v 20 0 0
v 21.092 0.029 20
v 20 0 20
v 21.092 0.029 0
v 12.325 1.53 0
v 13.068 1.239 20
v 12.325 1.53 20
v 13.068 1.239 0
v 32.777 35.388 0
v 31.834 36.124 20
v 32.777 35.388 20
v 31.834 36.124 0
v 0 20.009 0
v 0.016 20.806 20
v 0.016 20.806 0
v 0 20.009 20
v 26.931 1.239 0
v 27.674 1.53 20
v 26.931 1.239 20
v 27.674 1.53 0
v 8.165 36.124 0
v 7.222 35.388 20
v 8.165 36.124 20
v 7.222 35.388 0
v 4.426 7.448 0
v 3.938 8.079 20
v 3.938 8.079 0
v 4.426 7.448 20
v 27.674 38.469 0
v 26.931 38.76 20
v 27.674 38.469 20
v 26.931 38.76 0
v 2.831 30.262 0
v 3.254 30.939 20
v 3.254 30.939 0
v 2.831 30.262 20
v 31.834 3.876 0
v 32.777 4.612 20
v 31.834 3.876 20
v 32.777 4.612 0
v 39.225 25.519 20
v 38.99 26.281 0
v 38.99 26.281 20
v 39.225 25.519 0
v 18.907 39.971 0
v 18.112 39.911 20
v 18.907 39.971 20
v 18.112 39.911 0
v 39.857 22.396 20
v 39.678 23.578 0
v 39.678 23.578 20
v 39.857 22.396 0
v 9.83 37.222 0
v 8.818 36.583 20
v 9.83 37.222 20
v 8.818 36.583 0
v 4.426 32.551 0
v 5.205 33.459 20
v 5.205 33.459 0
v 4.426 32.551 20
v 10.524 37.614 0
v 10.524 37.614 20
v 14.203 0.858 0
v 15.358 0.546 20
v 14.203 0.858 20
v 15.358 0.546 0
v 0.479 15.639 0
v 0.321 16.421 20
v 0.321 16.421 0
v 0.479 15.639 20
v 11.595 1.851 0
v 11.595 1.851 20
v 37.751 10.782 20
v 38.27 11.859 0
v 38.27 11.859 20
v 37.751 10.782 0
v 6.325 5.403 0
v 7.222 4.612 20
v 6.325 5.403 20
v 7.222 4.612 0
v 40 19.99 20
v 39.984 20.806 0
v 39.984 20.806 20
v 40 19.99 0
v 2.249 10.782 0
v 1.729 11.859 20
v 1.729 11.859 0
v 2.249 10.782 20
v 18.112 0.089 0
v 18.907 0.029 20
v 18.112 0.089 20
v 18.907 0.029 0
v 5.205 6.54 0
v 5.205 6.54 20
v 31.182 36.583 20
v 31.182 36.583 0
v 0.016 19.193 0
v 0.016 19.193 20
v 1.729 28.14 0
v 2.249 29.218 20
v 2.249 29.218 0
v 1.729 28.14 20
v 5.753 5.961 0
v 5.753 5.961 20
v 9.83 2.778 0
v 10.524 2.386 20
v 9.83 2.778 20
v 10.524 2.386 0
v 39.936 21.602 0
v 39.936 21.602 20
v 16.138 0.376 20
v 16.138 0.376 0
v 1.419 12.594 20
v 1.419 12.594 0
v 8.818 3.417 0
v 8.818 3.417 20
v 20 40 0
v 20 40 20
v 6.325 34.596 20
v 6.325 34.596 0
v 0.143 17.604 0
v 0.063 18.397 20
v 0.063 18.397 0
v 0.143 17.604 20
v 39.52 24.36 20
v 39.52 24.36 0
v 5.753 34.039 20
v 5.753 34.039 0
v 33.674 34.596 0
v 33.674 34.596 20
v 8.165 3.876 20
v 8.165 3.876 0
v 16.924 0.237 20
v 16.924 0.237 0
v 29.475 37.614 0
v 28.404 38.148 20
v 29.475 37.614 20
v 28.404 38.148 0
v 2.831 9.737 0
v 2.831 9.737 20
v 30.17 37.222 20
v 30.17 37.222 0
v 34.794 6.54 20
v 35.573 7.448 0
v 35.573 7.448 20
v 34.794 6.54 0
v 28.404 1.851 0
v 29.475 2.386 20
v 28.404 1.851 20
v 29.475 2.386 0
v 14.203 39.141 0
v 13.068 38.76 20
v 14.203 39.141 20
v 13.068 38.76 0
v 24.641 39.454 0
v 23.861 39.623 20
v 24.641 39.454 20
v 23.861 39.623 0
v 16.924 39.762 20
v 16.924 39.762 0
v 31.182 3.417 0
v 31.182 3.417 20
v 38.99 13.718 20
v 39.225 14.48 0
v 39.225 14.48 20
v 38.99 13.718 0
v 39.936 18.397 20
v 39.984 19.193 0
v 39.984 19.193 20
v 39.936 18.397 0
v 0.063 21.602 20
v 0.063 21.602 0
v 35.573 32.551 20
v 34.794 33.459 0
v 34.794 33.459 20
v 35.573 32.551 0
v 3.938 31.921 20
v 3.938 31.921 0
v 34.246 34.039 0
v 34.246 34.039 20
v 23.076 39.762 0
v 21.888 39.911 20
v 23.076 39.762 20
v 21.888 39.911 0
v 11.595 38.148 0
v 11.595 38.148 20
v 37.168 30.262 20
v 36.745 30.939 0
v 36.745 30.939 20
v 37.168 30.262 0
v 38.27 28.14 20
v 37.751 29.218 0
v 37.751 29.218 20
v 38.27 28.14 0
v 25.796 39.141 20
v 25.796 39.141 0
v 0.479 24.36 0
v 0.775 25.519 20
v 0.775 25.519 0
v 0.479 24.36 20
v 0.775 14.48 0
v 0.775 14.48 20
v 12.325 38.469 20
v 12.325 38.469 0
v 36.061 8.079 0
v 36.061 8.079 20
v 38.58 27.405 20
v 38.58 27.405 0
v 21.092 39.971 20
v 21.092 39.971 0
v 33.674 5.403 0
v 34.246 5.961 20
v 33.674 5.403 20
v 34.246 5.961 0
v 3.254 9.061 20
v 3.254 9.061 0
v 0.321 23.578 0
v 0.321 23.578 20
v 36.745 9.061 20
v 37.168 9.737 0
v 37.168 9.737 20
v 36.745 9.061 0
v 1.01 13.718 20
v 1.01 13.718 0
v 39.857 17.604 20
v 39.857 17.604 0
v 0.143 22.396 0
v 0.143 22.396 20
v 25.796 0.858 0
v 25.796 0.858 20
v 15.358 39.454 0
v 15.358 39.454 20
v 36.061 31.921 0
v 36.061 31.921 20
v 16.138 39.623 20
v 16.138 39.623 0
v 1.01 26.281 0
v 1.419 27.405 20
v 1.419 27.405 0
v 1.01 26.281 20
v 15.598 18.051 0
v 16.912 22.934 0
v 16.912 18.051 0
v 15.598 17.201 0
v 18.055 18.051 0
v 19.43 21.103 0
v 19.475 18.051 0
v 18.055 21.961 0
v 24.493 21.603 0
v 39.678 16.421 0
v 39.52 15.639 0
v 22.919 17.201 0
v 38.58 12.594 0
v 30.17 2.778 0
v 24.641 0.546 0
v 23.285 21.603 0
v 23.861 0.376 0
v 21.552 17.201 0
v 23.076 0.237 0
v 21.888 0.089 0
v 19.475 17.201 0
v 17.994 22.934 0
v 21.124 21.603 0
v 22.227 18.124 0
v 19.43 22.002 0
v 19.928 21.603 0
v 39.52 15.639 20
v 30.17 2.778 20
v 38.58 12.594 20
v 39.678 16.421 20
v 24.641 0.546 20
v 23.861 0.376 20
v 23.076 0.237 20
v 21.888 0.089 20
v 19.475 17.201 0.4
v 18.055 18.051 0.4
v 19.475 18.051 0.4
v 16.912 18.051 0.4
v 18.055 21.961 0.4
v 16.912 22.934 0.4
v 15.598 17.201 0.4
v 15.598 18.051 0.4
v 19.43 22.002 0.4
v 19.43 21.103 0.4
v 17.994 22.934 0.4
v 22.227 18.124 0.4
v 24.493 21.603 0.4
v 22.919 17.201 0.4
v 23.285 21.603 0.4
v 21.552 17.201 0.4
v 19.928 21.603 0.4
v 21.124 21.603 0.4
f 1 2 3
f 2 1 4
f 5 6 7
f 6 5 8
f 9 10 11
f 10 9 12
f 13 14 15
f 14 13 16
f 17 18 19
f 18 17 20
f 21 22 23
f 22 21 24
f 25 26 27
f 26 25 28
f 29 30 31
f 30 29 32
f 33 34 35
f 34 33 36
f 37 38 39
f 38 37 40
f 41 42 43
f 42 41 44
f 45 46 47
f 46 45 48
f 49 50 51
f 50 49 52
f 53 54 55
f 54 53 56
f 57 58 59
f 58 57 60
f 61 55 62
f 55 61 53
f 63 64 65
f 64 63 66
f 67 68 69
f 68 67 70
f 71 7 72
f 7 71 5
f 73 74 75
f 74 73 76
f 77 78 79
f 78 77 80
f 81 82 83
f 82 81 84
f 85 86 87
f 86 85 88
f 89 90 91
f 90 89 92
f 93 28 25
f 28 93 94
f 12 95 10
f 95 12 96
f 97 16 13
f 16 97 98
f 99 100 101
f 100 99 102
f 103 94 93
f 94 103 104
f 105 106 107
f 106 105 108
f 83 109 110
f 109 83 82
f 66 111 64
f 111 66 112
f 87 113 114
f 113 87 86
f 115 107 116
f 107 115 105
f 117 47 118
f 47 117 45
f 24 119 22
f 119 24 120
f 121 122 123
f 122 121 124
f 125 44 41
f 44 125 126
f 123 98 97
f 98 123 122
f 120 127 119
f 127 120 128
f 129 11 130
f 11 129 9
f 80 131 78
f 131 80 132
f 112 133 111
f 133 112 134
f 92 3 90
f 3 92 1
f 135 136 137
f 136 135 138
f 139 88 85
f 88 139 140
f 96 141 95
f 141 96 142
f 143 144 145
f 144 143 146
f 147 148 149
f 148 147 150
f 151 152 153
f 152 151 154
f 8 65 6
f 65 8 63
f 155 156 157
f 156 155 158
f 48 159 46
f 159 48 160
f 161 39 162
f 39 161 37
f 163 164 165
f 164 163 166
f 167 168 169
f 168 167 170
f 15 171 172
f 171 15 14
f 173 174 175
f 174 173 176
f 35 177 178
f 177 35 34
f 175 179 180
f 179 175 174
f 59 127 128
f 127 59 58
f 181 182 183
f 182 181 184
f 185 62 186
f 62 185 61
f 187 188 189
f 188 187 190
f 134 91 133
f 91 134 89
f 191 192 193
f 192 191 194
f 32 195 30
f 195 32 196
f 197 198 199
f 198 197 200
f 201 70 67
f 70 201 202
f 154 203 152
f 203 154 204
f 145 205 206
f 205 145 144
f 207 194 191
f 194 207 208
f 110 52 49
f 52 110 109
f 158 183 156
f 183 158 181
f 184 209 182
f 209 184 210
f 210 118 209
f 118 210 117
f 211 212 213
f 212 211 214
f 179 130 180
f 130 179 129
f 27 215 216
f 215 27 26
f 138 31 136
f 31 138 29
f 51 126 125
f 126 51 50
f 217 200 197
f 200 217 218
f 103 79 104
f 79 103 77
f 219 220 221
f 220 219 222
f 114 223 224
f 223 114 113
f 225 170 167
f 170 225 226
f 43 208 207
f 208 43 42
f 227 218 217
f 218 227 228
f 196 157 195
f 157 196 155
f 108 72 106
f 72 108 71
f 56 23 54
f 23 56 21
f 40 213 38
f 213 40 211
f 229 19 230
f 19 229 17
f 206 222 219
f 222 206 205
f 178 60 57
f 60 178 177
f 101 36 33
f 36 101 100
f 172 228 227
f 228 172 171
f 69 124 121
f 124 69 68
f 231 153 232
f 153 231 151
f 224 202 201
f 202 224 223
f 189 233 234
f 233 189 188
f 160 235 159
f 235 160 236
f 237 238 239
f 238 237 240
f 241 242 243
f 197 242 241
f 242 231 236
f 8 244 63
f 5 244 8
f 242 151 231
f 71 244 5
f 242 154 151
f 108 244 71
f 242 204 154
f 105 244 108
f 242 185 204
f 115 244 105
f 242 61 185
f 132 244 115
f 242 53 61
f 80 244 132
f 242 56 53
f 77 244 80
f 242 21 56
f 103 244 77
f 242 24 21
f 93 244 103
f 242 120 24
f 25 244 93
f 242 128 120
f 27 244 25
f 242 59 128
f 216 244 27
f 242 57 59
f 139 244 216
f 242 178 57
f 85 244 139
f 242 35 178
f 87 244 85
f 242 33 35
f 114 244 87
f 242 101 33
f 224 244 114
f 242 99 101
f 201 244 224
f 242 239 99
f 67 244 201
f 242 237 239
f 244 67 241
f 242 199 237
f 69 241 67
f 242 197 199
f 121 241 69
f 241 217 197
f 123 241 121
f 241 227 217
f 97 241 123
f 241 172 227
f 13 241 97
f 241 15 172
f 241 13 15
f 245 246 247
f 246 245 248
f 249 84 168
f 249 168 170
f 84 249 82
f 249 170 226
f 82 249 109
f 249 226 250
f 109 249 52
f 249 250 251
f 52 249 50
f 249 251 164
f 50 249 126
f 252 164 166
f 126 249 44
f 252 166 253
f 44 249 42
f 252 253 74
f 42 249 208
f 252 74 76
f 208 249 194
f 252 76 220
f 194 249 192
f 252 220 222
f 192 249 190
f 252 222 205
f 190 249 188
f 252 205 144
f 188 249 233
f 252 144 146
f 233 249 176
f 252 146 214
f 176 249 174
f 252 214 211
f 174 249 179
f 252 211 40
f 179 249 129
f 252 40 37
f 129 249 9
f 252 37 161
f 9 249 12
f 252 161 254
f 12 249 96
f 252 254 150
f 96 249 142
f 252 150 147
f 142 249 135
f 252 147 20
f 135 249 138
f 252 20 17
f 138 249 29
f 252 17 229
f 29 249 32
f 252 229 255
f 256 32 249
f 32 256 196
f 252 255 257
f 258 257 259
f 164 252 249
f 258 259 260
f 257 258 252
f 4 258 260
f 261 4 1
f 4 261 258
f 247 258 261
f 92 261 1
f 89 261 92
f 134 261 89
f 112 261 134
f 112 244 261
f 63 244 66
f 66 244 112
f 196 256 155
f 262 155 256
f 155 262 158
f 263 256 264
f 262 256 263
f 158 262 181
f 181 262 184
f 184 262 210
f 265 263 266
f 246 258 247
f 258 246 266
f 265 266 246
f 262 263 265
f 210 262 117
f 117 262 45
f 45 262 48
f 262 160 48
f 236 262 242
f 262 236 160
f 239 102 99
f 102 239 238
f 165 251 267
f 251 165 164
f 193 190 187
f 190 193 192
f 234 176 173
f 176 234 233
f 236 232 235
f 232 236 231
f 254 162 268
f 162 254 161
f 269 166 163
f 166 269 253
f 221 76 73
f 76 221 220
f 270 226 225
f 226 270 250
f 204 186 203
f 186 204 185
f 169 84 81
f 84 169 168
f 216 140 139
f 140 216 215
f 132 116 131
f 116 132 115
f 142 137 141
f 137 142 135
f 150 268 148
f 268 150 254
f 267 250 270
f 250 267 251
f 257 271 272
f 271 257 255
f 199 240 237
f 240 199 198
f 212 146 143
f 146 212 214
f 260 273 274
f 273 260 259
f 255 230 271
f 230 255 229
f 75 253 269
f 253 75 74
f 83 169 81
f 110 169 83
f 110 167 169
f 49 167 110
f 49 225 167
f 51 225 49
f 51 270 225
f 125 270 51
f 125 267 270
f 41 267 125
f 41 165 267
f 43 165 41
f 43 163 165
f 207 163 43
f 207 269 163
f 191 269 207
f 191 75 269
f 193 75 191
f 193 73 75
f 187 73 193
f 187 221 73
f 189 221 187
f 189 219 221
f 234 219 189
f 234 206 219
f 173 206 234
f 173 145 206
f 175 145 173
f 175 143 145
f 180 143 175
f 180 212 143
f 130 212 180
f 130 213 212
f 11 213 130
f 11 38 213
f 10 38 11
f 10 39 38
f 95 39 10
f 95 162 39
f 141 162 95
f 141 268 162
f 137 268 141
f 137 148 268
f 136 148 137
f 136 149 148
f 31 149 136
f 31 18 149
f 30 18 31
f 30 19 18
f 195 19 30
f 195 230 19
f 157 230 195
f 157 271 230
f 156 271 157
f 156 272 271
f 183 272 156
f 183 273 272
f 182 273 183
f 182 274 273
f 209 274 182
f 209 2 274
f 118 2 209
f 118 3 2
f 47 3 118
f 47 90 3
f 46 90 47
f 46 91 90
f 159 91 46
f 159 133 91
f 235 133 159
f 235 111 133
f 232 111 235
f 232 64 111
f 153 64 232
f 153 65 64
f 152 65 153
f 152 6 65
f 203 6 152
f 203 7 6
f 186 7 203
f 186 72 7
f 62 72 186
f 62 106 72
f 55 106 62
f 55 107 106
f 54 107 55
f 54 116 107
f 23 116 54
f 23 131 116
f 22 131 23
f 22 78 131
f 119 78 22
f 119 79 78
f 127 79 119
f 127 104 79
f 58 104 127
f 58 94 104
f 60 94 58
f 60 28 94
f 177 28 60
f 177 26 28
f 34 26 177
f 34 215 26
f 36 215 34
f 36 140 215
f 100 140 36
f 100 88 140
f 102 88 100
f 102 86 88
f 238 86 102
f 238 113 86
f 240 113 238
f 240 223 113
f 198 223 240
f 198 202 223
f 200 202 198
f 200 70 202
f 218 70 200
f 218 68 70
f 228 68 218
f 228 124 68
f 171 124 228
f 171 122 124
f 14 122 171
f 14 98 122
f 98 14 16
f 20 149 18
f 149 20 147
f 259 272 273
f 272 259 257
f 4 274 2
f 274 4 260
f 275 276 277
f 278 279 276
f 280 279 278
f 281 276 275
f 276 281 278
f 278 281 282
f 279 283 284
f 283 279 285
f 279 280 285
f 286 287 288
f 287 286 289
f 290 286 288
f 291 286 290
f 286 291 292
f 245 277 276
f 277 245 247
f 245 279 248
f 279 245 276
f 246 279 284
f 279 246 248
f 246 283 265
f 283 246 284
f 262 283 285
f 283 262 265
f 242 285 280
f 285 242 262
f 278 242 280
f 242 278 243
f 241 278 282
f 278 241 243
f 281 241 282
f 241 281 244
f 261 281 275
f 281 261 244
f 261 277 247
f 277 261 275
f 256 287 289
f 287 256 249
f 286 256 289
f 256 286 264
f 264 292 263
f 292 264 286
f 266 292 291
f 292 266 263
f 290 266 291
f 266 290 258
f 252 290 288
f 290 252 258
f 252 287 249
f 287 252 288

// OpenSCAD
// circletest — generated by protobot from a sketch (input.jpg)
// 2026-10-28
//
// Print: Prusa Core One, 0.4 mm nozzle, PLA, 0.2 mm layers, flat on the bed.
// The outline is stored in a 0..1 unit box and scaled by LENGTH/WIDTH, so
// the three measurements below are all you need to change. Re-export with:
//   openscad --backend=manifold --export-format binstl -o circletest.stl circletest.scad
//
// Dimension tags: [M] = given by the user, [S] = traced from the sketch.

/* [Measurements] */
LENGTH    = 40;   // [M] X extent, mm
WIDTH     = 40;   // [M] Y extent, mm
THICKNESS = 20;   // [M] extrusion height, mm

/* [Edge finish] */
// Perimeter edges (outline AND holes), top and bottom faces.
// "fillet" = rounded, "chamfer" = 45°, "none" = sharp. Built in LAYER steps,
// i.e. exactly as the printer will lay it down.
EDGE_TOP_KIND    = "none";
EDGE_TOP         = 0;     // mm
EDGE_BOTTOM_KIND = "none";
EDGE_BOTTOM      = 0;     // mm
LAYER            = 0.2;   // mm, print layer height

/* [Version stamp] */
VERSION        = 1;       // bump every revision
VERSION_POS    = [0.5000, 0.5000];  // [S] unit-box spot deepest inside the shape
VERSION_SIZE   = 6;      // mm text height
VERSION_DEPTH  = 0.4;    // mm, 2 layers at 0.2

/* [Screws and nuts] */
// One entry per screw hole: [x, y] in the unit box (scaled by LENGTH/WIDTH),
// then its cuts: ["circle", Ø] = screw-head recess, ["hex", across flats] =
// nut pocket, each [.., depth mm, "top"|"bottom"]. The clearance hole itself
// is part of the outline below.
FASTENERS = [];

/* [Hidden] */
// [S] traced outline (+ holes), unit box, y up.
OUTLINE_PTS = [
    [1.00000,0.49977], [0.99960,0.47984], [0.99841,0.45994], [0.99642,0.44010], [0.99196,0.41053], [0.98801,0.39099],
    [0.98063,0.36201], [0.97475,0.34296], [0.96451,0.31486], [0.95676,0.29649], [0.94378,0.26955], [0.92921,0.24343],
    [0.91864,0.22652], [0.90154,0.20198], [0.88933,0.18621], [0.86987,0.16350], [0.85616,0.14902], [0.84187,0.13510],
    [0.81944,0.11531], [0.79586,0.09690], [0.77955,0.08543], [0.75425,0.06945], [0.73688,0.05966], [0.71011,0.04628],
    [0.69185,0.03826], [0.67328,0.03098], [0.64491,0.02146], [0.61603,0.01365], [0.59654,0.00940], [0.57689,0.00594],
    [0.54720,0.00222], [0.52731,0.00073], [0.50000,0.00000], [0.47269,0.00073], [0.45280,0.00222], [0.42311,0.00594],
    [0.40346,0.00940], [0.38397,0.01365], [0.35509,0.02146], [0.32672,0.03098], [0.30815,0.03826], [0.28989,0.04628],
    [0.26312,0.05966], [0.24575,0.06945], [0.22045,0.08543], [0.20414,0.09690], [0.18056,0.11531], [0.15813,0.13510],
    [0.14384,0.14902], [0.13013,0.16350], [0.11067,0.18621], [0.09846,0.20198], [0.08136,0.22652], [0.07079,0.24343],
    [0.05622,0.26955], [0.04324,0.29649], [0.03549,0.31486], [0.02525,0.34296], [0.01937,0.36201], [0.01199,0.39099],
    [0.00804,0.41053], [0.00358,0.44010], [0.00159,0.45994], [0.00040,0.47984], [0.00000,0.50023], [0.00040,0.52016],
    [0.00159,0.54006], [0.00358,0.55990], [0.00804,0.58947], [0.01199,0.60901], [0.01937,0.63799], [0.02525,0.65704],
    [0.03549,0.68514], [0.04324,0.70351], [0.05622,0.73045], [0.07079,0.75657], [0.08136,0.77348], [0.09846,0.79802],
    [0.11067,0.81379], [0.13013,0.83650], [0.14384,0.85098], [0.15813,0.86490], [0.18056,0.88469], [0.20414,0.90310],
    [0.22045,0.91457], [0.24575,0.93055], [0.26312,0.94034], [0.28989,0.95372], [0.30815,0.96174], [0.32672,0.96902],
    [0.35509,0.97854], [0.38397,0.98635], [0.40346,0.99060], [0.42311,0.99406], [0.45280,0.99778], [0.47269,0.99927],
    [0.50000,1.00000], [0.52731,0.99927], [0.54720,0.99778], [0.57689,0.99406], [0.59654,0.99060], [0.61603,0.98635],
    [0.64491,0.97854], [0.67328,0.96902], [0.69185,0.96174], [0.71011,0.95372], [0.73688,0.94034], [0.75425,0.93055],
    [0.77955,0.91457], [0.79586,0.90310], [0.81944,0.88469], [0.84187,0.86490], [0.85616,0.85098], [0.86987,0.83650],
    [0.88933,0.81379], [0.90154,0.79802], [0.91864,0.77348], [0.92921,0.75657], [0.94378,0.73045], [0.95676,0.70351],
    [0.96451,0.68514], [0.97475,0.65704], [0.98063,0.63799], [0.98801,0.60901], [0.99196,0.58947], [0.99642,0.55990],
    [0.99841,0.54006], [0.99960,0.52016]
];
OUTLINE_PATHS = [
    [for (i = [0:127]) i]
];

module outline_2d() {
    scale([LENGTH, WIDTH]) polygon(points = OUTLINE_PTS, paths = OUTLINE_PATHS);
}

// Debossed into the bottom face, mirrored so it reads from underneath.
module version_stamp() {
    if (!is_undef(VERSION_POS) && VERSION_SIZE > 0)
        translate([VERSION_POS[0] * LENGTH, VERSION_POS[1] * WIDTH, -0.01])
            linear_extrude(VERSION_DEPTH + 0.01)
                mirror([1, 0])
                    text(str("v", VERSION), size = VERSION_SIZE,
                         font = "Liberation Sans:style=Bold",
                         halign = "center", valign = "center");
}

// Screw-head recesses and nut pockets, cut into the top or bottom face.
module fastener_cuts() {
    for (f = FASTENERS) for (c = f[1])
        translate([f[0][0] * LENGTH, f[0][1] * WIDTH,
                   c[3] == "top" ? THICKNESS - c[2] : -0.01])
            linear_extrude(c[2] + 0.01 + (c[3] == "top" ? 0.01 : 0))
                if (c[0] == "hex") circle(d = c[1] / cos(30), $fn = 6);
                else circle(d = c[1]);
}

// How far the outline is pulled in at depth d (0..r) into a finished edge.
function edge_inset(kind, r, d) =
    kind == "chamfer" ? max(0, r - d) :
    kind == "fillet"  ? r - sqrt(max(0, r * r - (r - min(d, r)) * (r - min(d, r)))) : 0;

module body() {
    nb = EDGE_BOTTOM_KIND == "none" ? 0 : ceil(EDGE_BOTTOM / LAYER - 1e-6);
    nt = EDGE_TOP_KIND    == "none" ? 0 : ceil(EDGE_TOP / LAYER - 1e-6);
    zb = nb * LAYER;
    zt = nt * LAYER;
    union() {
        // straight-walled core, overlapping the finished layers (no shared faces)
        translate([0, 0, zb - (nb > 0 ? 0.01 : 0)])
            linear_extrude(THICKNESS - zb - zt + (nb > 0 ? 0.01 : 0) + (nt > 0 ? 0.01 : 0))
                outline_2d();
        if (nb > 0) for (i = [0 : nb - 1])
            translate([0, 0, i * LAYER])
                linear_extrude(LAYER + 0.01)
                    offset(delta = -edge_inset(EDGE_BOTTOM_KIND, EDGE_BOTTOM, (i + 0.5) * LAYER))
                        outline_2d();
        if (nt > 0) for (i = [0 : nt - 1])
            translate([0, 0, THICKNESS - (i + 1) * LAYER - (i < nt - 1 ? 0.01 : 0)])
                linear_extrude(LAYER + (i < nt - 1 ? 0.01 : 0))
                    offset(delta = -edge_inset(EDGE_TOP_KIND, EDGE_TOP, (i + 0.5) * LAYER))
                        outline_2d();
    }
}

module part() {
    $fa = 2; $fs = 0.4;
    difference() {
        body();
        version_stamp();
        fastener_cuts();
    }
}

part();
